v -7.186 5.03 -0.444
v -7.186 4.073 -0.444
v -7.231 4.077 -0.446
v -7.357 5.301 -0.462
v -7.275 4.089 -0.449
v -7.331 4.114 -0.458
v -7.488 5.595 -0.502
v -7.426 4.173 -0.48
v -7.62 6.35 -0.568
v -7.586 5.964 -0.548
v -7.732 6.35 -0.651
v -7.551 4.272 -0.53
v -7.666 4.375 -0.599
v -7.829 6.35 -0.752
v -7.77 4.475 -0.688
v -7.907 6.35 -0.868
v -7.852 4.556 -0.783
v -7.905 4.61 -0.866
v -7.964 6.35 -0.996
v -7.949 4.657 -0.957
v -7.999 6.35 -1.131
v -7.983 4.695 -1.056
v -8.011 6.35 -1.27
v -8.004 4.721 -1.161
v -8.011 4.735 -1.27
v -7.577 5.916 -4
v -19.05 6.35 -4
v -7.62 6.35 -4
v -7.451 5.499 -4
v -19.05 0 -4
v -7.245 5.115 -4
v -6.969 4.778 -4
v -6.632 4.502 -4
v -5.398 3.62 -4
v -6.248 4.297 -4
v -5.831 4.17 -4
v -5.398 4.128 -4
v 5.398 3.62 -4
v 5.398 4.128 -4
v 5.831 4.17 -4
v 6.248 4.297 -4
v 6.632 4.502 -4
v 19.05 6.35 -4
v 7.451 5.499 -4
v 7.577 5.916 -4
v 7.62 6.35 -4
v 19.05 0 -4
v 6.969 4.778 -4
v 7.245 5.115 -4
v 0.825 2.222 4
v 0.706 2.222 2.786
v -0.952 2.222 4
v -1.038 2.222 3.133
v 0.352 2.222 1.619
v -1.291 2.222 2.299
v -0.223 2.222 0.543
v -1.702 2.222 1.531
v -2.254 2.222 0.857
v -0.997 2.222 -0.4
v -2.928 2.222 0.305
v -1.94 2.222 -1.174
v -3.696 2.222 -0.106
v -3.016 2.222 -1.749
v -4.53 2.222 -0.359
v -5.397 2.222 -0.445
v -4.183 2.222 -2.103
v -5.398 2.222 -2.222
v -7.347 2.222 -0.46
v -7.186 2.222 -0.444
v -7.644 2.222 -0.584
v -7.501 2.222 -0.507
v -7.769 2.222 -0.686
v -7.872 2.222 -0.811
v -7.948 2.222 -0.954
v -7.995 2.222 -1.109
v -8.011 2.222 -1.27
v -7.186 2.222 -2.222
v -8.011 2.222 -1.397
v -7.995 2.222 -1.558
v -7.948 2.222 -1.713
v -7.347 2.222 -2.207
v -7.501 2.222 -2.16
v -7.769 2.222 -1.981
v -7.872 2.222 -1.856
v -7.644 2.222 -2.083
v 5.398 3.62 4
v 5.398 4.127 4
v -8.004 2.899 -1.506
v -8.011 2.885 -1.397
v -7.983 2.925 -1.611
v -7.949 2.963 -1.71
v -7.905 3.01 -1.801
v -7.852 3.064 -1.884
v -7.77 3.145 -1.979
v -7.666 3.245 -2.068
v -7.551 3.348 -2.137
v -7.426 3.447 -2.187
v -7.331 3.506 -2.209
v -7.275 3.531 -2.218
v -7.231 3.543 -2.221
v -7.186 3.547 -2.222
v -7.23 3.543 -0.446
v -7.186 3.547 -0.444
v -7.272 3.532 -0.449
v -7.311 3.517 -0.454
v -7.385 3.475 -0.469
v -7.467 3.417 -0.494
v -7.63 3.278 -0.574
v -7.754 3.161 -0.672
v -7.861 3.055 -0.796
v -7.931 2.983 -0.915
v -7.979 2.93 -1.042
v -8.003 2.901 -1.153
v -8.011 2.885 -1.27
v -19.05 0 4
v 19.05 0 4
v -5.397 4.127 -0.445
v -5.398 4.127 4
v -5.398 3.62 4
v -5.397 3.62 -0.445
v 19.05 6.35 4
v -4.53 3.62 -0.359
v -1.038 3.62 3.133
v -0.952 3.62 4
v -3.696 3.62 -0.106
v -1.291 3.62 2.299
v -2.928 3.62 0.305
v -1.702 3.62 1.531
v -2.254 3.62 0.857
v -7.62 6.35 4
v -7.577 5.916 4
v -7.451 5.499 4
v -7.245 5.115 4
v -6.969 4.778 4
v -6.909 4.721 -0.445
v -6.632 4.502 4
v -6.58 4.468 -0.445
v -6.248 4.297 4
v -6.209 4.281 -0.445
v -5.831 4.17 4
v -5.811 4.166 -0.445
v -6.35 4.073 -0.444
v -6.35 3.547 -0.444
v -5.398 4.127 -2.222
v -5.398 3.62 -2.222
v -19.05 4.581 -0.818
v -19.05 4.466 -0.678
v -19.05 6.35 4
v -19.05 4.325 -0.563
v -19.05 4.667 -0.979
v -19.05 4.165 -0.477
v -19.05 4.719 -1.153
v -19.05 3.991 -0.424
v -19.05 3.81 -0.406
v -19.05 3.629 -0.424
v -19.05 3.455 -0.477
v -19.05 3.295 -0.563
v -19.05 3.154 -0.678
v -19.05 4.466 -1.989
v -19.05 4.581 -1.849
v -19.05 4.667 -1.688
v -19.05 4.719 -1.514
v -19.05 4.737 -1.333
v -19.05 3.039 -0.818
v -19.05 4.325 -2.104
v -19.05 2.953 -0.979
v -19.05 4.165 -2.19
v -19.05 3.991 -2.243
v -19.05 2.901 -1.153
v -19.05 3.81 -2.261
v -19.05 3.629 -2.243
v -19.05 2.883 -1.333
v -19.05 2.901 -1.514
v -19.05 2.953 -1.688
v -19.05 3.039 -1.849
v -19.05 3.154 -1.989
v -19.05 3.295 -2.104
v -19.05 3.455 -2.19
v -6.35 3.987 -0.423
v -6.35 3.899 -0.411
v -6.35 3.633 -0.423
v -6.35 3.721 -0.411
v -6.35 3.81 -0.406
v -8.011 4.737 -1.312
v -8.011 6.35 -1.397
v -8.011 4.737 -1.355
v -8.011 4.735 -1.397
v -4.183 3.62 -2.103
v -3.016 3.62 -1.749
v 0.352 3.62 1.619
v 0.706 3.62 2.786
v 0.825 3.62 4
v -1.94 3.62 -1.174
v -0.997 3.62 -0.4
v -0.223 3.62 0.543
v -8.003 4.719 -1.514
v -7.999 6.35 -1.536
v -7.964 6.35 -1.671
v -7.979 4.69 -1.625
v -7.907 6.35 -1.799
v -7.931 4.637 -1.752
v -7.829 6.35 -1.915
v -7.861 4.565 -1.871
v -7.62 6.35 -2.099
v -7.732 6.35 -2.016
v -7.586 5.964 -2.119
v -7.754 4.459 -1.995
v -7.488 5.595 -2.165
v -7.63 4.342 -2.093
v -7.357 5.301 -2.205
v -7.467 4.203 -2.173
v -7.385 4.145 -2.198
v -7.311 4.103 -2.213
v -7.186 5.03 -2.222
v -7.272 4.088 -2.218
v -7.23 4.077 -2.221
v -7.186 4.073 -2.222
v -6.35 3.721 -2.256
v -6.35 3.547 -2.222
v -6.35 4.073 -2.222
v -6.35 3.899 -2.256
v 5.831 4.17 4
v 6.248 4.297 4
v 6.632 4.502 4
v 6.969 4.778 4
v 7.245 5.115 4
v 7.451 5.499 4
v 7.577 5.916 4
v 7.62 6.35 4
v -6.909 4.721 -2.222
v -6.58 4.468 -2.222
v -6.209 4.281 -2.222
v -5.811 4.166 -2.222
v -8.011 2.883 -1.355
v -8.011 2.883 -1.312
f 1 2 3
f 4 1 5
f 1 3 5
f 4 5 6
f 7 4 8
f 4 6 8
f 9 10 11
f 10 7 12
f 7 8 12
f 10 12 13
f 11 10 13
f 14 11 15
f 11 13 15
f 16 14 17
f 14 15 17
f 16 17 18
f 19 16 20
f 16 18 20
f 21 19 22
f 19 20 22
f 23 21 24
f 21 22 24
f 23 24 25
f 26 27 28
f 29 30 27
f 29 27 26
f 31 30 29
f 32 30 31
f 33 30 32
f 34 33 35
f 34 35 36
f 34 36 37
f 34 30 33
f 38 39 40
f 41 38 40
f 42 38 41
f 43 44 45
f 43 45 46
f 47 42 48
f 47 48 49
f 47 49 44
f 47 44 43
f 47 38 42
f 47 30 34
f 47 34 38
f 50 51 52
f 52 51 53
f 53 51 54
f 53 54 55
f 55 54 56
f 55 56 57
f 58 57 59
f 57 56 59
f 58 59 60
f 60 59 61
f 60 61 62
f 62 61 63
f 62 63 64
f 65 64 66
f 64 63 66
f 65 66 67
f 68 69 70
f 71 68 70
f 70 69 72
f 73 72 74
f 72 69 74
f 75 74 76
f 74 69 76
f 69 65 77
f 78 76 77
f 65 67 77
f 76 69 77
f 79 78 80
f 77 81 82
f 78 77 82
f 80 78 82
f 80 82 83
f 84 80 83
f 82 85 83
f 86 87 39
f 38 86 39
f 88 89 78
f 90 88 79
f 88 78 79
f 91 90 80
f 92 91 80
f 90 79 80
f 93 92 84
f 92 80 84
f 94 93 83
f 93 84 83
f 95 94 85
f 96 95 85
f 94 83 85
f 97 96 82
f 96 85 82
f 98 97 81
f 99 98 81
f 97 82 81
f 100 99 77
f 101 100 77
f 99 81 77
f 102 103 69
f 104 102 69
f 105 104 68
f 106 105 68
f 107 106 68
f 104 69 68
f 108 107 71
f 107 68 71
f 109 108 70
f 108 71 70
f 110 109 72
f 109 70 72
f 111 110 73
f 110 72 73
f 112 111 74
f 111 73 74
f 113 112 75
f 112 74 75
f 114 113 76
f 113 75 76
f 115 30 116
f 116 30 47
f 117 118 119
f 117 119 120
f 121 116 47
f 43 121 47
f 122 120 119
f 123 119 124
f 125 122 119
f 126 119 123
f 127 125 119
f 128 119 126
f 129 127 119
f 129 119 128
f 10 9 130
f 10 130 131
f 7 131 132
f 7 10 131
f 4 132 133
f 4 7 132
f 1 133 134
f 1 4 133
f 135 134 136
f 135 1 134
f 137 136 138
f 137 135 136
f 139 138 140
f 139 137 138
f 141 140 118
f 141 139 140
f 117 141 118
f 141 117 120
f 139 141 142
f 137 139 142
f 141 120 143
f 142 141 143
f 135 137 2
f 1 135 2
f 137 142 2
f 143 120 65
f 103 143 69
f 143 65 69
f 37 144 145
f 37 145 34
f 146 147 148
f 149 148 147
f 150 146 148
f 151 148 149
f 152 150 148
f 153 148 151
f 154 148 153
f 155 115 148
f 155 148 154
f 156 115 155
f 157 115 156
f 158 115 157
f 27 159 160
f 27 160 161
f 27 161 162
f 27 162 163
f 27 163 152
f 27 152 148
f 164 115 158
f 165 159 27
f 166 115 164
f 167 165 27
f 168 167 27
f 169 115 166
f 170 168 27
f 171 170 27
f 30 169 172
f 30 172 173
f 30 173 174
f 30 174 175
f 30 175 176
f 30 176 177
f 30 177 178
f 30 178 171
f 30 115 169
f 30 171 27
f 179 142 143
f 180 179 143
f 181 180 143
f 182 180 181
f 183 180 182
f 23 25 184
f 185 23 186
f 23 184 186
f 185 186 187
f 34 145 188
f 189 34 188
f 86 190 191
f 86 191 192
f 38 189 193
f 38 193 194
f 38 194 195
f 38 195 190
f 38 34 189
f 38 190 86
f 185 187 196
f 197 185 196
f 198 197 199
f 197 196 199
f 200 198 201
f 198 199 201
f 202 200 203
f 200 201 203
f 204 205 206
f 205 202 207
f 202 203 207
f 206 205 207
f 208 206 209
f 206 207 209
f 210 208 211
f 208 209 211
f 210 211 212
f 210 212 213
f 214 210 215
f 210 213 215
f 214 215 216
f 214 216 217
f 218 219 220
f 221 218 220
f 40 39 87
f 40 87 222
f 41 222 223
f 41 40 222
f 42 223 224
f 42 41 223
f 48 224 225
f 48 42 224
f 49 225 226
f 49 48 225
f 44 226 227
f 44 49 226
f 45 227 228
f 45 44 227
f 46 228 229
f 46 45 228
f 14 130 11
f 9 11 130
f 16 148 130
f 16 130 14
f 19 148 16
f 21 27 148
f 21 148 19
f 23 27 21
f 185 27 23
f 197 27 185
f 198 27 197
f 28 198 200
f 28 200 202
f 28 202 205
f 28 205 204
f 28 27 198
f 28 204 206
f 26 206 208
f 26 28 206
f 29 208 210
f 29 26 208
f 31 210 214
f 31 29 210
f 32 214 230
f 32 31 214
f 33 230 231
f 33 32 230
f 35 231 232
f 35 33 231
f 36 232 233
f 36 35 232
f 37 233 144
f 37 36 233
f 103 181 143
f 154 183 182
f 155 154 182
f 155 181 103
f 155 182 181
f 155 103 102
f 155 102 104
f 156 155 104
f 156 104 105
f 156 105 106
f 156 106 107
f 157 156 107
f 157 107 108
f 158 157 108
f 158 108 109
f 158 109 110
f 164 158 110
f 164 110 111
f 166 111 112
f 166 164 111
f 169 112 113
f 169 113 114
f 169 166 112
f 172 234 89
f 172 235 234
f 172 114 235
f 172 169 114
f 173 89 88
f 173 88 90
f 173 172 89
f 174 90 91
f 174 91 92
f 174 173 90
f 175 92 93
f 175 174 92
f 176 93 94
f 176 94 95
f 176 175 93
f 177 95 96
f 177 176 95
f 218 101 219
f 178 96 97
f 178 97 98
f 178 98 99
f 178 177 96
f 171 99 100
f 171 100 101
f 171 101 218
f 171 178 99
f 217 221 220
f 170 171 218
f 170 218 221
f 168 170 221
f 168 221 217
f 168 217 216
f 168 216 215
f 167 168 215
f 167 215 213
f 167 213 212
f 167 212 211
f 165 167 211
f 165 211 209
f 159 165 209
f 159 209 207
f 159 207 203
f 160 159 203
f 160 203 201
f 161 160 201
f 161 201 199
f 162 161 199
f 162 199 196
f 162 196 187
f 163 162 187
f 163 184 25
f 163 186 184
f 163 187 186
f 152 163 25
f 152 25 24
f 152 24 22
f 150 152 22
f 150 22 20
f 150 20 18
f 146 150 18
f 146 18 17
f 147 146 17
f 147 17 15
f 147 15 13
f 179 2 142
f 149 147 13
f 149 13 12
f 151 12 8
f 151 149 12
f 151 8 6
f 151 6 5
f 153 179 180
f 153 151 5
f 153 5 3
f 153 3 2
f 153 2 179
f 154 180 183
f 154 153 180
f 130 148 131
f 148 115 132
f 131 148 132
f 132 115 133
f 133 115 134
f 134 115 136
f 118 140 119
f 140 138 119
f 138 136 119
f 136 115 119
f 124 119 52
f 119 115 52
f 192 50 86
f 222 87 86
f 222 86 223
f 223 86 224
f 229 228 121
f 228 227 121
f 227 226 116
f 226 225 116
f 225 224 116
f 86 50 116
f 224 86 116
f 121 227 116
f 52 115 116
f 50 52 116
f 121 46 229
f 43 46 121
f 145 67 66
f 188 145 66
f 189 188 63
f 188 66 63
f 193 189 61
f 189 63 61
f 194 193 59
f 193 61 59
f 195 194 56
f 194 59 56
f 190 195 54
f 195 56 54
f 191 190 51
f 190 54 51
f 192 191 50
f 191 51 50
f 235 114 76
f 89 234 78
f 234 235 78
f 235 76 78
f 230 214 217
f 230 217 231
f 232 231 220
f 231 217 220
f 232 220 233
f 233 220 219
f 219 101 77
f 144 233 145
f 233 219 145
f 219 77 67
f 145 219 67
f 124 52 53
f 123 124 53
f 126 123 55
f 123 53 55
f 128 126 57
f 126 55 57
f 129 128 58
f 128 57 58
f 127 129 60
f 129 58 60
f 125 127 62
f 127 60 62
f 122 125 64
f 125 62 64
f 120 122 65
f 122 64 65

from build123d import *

# Parameters (mm, degrees)
SKETCH1_W               = 38.1
SKETCH1_H               = 8.001
BOSS_EXTRUDE1_DEPTH     = 6.35
CUT_EXTRUDE1_DEPTH      = 25.4
CUT_EXTRUDE2_DEPTH      = 20.898310393
CUT_EXTRUDE2_DEPTH_BACK = 1.905
CUT_EXTRUDE3_START      = -38.1
SKETCH5_R               = 0.9271
CUT_EXTRUDE3_DEPTH      = 12.7
SKETCH6_W               = 10.795
SKETCH6_H               = 8.001
CUT_EXTRUDE4_DEPTH      = 0.508


with BuildPart() as part:
    # Sketch1 → Boss-Extrude1 (new body)
    with BuildSketch(Plane(origin=(0, 0, 0), x_dir=(1, 0, 0), z_dir=(0, 1, 0))):
        Rectangle(SKETCH1_W, SKETCH1_H)
    extrude(amount=BOSS_EXTRUDE1_DEPTH)

    # Sketch2 → Cut-Extrude1 (cut)
    with BuildSketch(Plane(origin=(0, 0, -4.0005), x_dir=(-1, 0, 0), z_dir=(0, 0, -1))):
        with BuildLine():
            Line((5.3975, 4.1275), (-5.3975, 4.1275))
            ThreePointArc((-5.3975, 4.1275), (-7.62, 6.35), (-5.3975, 8.5725))
            Line((-5.3975, 8.5725), (5.3975, 8.5725))
            ThreePointArc((5.3975, 8.5725), (7.62, 6.35), (5.3975, 4.1275))
        make_face()
    extrude(amount=-CUT_EXTRUDE1_DEPTH, mode=Mode.SUBTRACT)

    # Sketch4 → Cut-Extrude2 (cut, two sides: drawn at the far end of the back side and taken through both)
    with BuildSketch(Plane(origin=(0, 4.1275, 0), x_dir=(1, 0, 0), z_dir=(0, 1, 0)).offset(-CUT_EXTRUDE2_DEPTH_BACK)):
        with BuildLine():
            Line((0.8255, -4.0005), (-0.9525, -4.0005))
            ThreePointArc((-0.9525, -4.0005), (-2.254410358, -0.857410358), (-5.3975, 0.4445))
            Line((-5.3975, 0.4445), (-7.185501788, 0.4445))
            ThreePointArc((-7.185501788, 0.4445), (-7.769218436, 0.686283352), (-8.011001788, 1.27))
            Line((-8.011001788, 1.27), (-8.011001788, 1.397))
            ThreePointArc((-8.011001788, 1.397), (-7.769218436, 1.980716648), (-7.185501788, 2.2225))
            Line((-7.185501788, 2.2225), (-5.3975, 2.2225))
            ThreePointArc((-5.3975, 2.2225), (-0.997174501, 0.399825499), (0.8255, -4.0005))
        make_face()
    extrude(amount=CUT_EXTRUDE2_DEPTH + CUT_EXTRUDE2_DEPTH_BACK, mode=Mode.SUBTRACT)

    # Sketch5 → Cut-Extrude3 (cut)
    with BuildSketch(Plane(origin=(19.05, 0, 0), x_dir=(0, 0, -1), z_dir=(1, 0, 0)).offset(CUT_EXTRUDE3_START)):
        with Locations(Location((1.3335, 3.81, 0), (0, 0, 180))):
            Circle(SKETCH5_R)
    extrude(amount=CUT_EXTRUDE3_DEPTH, mode=Mode.SUBTRACT)

    # Sketch6 → Cut-Extrude4 (cut)
    with BuildSketch(Plane(origin=(0, 4.1275, 0), x_dir=(1, 0, 0), z_dir=(0, 1, 0))):
        Rectangle(SKETCH6_W, SKETCH6_H)
    extrude(amount=-CUT_EXTRUDE4_DEPTH, mode=Mode.SUBTRACT)


solid = part.part
